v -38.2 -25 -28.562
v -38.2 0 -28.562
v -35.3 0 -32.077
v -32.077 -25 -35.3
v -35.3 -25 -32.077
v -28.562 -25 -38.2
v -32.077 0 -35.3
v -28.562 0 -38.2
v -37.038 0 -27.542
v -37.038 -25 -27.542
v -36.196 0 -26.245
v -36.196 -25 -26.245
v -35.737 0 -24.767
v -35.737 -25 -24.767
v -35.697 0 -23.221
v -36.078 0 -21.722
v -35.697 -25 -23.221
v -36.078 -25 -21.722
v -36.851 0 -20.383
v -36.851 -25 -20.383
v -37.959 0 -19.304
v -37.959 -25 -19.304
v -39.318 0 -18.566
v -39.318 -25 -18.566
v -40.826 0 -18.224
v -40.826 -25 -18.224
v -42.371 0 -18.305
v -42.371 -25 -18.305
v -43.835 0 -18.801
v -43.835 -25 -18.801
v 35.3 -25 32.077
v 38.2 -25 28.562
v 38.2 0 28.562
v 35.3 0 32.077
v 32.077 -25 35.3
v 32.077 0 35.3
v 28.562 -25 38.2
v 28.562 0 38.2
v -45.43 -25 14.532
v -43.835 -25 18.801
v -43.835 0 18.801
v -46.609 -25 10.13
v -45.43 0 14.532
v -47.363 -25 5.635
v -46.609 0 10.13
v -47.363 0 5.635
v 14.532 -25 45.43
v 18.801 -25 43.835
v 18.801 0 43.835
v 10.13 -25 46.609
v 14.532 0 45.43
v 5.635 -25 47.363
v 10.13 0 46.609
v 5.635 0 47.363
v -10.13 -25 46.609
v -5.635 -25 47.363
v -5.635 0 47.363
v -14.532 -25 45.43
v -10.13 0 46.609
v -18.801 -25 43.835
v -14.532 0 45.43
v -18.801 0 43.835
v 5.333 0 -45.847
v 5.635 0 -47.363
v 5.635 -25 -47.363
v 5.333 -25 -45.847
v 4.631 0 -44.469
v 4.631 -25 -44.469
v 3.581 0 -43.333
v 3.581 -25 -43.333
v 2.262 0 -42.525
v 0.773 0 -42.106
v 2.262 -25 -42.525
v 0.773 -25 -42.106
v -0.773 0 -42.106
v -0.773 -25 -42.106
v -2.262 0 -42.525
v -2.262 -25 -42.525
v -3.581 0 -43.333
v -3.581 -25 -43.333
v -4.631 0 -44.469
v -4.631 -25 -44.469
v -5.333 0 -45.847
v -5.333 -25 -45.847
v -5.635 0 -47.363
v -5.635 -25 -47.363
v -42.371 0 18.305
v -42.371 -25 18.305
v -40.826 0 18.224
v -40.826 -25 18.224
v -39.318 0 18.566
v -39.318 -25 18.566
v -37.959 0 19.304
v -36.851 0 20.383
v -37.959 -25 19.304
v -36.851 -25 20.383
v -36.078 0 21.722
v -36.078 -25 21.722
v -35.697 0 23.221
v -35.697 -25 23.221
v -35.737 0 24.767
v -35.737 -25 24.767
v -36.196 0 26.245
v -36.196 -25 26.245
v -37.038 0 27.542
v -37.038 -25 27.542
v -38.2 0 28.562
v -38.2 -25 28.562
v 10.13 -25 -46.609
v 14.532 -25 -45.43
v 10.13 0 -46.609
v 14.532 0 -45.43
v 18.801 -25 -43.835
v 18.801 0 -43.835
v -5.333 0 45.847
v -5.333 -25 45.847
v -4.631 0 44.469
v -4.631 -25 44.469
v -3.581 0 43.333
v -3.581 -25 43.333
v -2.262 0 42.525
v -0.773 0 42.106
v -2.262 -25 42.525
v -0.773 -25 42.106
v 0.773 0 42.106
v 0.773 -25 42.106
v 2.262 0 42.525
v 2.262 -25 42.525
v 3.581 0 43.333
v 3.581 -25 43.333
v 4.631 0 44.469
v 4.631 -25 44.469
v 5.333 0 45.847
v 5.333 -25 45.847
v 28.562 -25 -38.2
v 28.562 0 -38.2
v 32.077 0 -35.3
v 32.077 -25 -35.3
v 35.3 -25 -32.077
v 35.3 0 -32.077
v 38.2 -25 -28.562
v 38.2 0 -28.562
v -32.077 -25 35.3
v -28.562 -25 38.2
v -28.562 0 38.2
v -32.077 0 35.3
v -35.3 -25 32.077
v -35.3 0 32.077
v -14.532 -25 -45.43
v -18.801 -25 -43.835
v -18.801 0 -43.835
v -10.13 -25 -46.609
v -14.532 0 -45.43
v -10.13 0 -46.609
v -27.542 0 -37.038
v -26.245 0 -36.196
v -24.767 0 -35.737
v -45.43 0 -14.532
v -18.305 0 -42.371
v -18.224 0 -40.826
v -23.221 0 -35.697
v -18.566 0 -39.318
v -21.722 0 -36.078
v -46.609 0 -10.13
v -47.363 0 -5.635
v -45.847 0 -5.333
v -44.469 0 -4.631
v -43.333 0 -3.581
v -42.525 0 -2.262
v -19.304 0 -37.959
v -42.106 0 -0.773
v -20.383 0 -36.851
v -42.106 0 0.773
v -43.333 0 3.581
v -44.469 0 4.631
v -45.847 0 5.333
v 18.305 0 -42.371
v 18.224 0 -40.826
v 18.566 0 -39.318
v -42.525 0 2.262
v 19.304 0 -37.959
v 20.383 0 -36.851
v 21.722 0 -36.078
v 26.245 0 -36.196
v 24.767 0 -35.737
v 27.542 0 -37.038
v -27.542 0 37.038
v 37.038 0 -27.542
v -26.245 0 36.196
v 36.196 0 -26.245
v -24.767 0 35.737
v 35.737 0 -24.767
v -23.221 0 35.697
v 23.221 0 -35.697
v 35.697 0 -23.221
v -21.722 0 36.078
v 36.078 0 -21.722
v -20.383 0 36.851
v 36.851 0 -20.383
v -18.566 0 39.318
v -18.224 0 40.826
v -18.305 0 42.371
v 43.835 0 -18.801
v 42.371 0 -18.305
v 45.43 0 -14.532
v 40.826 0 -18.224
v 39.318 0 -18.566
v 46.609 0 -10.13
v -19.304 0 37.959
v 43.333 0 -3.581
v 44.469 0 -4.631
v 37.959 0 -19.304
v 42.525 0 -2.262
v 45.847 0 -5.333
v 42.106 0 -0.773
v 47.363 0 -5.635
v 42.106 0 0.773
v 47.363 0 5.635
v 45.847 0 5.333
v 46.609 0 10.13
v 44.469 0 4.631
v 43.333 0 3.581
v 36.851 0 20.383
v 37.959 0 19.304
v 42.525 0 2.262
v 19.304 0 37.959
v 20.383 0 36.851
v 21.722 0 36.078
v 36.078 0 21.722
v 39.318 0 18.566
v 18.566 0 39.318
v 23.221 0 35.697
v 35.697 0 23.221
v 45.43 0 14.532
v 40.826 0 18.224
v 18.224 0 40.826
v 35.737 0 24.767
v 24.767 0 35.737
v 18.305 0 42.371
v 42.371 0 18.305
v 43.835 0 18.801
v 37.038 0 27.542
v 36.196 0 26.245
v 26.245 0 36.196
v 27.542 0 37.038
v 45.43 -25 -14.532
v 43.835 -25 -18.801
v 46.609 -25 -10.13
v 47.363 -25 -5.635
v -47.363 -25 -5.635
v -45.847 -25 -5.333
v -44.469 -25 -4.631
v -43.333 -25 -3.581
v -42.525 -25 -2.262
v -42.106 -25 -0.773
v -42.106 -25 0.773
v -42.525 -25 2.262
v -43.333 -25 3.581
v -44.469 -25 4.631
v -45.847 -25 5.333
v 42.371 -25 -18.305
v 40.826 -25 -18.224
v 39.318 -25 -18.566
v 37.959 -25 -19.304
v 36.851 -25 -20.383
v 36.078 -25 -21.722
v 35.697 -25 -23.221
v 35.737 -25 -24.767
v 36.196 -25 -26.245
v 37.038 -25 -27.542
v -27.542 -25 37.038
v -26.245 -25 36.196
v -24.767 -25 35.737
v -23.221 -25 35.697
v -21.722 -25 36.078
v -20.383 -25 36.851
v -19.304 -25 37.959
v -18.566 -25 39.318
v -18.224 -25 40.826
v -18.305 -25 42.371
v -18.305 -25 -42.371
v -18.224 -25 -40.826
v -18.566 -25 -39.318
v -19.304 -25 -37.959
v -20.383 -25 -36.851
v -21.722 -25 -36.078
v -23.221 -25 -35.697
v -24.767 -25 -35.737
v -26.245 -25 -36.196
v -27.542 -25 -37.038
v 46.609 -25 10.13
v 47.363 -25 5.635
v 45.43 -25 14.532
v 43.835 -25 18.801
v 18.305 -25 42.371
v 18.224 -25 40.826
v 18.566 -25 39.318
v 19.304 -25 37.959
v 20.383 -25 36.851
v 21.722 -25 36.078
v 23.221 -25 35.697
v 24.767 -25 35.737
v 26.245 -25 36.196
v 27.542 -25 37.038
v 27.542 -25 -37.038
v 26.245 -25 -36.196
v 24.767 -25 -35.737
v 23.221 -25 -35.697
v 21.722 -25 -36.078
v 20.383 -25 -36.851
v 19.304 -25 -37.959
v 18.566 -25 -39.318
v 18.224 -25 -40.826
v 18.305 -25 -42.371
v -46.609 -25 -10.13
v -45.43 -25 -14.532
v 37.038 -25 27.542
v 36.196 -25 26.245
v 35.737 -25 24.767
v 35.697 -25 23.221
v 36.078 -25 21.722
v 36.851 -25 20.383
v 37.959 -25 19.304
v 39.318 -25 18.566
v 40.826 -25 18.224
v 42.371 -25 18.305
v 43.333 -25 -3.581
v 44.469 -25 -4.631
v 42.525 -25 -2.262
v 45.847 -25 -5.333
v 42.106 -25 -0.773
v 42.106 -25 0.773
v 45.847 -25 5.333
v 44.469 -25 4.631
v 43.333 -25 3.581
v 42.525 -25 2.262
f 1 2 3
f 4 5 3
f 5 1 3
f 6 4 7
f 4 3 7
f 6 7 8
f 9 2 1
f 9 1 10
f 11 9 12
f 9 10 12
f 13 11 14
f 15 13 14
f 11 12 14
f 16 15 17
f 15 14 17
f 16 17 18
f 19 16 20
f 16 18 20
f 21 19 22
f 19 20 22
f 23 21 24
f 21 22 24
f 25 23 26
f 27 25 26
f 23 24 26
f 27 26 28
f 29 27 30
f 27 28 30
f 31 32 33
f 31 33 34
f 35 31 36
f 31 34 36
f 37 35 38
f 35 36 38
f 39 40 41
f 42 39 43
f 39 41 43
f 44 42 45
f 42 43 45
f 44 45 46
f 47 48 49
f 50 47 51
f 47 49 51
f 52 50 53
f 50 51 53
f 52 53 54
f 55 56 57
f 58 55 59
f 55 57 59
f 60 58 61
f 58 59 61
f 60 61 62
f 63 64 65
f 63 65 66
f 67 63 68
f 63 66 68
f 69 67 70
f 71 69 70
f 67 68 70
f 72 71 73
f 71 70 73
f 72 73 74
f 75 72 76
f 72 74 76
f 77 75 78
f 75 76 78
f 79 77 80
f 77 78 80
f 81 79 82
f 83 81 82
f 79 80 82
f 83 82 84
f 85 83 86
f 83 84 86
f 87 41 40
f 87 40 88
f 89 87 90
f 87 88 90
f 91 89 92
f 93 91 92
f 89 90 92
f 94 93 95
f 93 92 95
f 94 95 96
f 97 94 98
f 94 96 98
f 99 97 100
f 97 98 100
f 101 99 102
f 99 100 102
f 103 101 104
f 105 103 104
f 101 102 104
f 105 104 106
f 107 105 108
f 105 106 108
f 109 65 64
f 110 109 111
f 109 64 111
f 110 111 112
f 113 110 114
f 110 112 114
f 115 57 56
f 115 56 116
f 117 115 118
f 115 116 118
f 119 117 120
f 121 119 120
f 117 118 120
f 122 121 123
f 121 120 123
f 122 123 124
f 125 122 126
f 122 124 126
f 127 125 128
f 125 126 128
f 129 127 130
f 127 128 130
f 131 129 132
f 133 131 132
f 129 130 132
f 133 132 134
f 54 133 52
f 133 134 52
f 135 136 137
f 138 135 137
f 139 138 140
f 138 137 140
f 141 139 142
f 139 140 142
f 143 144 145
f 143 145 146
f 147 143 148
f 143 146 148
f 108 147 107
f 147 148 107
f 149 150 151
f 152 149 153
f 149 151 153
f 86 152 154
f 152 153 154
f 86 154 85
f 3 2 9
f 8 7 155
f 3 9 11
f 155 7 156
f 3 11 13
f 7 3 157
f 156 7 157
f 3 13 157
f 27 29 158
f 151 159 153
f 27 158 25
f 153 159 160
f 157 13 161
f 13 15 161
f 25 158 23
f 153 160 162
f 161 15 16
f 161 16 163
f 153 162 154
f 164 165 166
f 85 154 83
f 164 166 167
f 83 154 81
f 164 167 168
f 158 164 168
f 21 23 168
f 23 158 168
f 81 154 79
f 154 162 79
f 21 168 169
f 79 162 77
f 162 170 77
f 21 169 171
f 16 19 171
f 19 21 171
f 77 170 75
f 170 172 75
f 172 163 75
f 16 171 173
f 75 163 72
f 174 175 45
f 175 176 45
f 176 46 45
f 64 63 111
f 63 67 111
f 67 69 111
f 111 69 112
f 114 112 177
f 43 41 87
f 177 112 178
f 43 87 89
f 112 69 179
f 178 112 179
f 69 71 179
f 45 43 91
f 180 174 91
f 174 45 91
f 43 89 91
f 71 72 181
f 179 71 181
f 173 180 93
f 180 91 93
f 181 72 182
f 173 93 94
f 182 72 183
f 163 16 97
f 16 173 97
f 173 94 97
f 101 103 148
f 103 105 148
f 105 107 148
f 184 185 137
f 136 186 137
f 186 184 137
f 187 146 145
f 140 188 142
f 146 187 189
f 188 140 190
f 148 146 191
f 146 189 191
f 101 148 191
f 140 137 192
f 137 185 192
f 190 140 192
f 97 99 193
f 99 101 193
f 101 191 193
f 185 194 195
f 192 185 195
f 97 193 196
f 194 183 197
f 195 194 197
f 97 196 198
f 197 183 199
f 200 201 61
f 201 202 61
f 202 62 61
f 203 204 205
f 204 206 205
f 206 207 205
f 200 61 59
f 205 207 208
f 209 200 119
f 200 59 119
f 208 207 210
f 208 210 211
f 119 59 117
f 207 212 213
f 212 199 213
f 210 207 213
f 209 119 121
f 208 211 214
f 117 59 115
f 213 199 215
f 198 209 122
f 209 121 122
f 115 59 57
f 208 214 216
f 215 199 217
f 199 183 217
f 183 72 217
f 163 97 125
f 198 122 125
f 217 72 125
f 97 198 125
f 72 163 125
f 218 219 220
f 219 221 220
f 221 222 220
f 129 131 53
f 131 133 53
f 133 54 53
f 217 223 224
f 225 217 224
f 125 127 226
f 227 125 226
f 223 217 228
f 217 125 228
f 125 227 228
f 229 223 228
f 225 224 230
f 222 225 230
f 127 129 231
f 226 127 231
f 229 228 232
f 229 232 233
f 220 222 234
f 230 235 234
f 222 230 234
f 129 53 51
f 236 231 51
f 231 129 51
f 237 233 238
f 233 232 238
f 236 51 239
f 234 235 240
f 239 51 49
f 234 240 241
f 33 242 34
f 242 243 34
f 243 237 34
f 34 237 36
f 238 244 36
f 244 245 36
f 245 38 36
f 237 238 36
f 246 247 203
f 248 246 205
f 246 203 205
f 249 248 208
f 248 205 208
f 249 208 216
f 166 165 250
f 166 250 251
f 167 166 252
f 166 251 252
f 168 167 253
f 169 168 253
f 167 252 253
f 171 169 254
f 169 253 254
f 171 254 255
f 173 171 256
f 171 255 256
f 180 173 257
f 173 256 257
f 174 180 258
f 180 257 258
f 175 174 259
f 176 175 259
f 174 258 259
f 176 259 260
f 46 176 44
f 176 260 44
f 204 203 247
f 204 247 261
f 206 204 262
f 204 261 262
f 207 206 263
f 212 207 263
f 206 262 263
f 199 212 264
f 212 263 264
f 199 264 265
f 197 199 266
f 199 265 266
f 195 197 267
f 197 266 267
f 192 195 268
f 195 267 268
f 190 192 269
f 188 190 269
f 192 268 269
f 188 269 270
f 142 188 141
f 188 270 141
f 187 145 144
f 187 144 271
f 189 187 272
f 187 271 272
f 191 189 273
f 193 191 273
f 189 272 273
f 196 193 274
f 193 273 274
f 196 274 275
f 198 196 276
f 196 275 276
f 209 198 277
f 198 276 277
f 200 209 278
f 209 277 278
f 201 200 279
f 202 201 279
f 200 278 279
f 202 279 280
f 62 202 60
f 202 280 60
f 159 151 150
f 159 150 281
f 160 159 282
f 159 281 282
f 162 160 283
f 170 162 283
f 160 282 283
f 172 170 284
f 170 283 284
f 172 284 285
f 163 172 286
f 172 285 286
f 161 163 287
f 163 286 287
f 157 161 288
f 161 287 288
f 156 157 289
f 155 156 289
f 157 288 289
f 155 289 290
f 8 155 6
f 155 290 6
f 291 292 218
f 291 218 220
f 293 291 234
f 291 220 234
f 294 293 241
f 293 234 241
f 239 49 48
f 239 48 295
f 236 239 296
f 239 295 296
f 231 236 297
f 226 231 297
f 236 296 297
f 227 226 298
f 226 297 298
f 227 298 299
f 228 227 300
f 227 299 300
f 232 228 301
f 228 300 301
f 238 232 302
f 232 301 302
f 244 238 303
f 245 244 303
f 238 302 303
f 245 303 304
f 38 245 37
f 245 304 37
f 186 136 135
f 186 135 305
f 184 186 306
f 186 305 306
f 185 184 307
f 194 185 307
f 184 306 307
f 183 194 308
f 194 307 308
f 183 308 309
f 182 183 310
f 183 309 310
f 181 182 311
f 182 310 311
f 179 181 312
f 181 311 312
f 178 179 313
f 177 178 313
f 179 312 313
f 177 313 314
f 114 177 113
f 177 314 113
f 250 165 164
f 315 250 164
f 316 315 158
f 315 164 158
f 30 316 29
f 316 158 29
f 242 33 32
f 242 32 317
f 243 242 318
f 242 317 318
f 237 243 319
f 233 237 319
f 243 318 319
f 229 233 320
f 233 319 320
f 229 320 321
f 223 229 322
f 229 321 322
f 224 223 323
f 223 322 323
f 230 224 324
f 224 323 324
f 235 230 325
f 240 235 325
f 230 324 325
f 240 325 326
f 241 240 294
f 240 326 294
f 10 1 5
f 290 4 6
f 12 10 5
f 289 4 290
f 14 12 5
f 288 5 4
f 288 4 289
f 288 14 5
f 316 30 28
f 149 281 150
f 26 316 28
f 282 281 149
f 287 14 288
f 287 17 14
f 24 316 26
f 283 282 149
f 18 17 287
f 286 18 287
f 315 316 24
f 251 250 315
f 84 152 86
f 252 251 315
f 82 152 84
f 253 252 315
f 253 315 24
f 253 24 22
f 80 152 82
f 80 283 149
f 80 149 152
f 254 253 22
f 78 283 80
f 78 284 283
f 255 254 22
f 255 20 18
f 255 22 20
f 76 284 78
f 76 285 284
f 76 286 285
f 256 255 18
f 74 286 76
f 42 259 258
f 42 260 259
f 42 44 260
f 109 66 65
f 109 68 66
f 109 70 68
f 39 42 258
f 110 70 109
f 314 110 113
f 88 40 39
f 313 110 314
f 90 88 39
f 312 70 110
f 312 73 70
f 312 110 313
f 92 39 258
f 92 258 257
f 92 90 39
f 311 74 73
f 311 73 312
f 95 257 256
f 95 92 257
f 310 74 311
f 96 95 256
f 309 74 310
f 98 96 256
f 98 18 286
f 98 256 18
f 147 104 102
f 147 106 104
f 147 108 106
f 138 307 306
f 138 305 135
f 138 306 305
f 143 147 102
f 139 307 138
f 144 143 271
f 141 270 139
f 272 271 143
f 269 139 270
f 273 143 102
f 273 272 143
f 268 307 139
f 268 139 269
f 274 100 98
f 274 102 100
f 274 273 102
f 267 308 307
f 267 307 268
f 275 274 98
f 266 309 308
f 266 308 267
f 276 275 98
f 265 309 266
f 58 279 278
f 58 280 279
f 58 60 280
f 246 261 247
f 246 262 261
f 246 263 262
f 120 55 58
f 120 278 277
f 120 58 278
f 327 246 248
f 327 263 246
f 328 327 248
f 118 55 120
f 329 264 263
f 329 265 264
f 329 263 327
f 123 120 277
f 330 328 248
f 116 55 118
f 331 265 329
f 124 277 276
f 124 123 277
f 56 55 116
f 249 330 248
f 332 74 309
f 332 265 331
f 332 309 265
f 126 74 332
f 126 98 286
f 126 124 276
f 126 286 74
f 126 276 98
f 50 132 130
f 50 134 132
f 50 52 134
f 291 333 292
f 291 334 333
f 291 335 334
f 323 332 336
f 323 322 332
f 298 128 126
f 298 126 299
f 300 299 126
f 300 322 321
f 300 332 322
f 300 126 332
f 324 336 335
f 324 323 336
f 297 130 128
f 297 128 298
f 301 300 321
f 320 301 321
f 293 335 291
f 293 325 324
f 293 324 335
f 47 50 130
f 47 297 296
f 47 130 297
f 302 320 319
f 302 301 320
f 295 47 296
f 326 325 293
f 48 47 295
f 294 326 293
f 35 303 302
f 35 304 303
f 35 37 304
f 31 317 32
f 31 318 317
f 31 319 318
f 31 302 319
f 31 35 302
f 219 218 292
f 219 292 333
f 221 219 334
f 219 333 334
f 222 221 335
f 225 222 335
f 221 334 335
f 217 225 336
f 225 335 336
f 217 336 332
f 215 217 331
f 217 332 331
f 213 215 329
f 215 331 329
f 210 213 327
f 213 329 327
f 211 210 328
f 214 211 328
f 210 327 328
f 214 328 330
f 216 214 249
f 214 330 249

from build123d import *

# Parameters (mm, degrees)
F0_R            = 47.6973653994
F1_DEPTH        = 25
F3_DEPTH        = 25
F3_COPIES_COUNT = 12


# Not quite as in the source:
# - a feature of the source that left no trace in its solid (it failed there, or was rolled back) is left out
# - a pattern or mirror of a feature is missing from the dataset's text; its kind, count and spacing are read off the source's solid


with BuildPart() as f1:
    # F0 (on Front) → F1 (new body)
    with BuildSketch(Plane.XZ):
        Circle(F0_R)
    extrude(amount=F1_DEPTH)

    # F2 (on face) → F3 (cut)
    with BuildSketch(Plane.XZ.offset(25)):
        with BuildLine():
            ThreePointArc((5.635130152, 47.3633188683), (0, 47.6973653994), (-5.635130152, 47.3633188683))
            ThreePointArc((-5.635130152, 47.3633188683), (0, 42.0523429092), (5.635130152, 47.3633188683))
        make_face()
    f3 = extrude(amount=-F3_DEPTH, mode=Mode.SUBTRACT)

    # F3_copies: F3 ×12 about axis
    f3_copies_axis = Axis((0, 0, 0), (0, 1, 0))
    for i in range(1, F3_COPIES_COUNT):
        add(f3.rotate(f3_copies_axis, i * 360 / F3_COPIES_COUNT), mode=Mode.SUBTRACT)


solid = f1.part
